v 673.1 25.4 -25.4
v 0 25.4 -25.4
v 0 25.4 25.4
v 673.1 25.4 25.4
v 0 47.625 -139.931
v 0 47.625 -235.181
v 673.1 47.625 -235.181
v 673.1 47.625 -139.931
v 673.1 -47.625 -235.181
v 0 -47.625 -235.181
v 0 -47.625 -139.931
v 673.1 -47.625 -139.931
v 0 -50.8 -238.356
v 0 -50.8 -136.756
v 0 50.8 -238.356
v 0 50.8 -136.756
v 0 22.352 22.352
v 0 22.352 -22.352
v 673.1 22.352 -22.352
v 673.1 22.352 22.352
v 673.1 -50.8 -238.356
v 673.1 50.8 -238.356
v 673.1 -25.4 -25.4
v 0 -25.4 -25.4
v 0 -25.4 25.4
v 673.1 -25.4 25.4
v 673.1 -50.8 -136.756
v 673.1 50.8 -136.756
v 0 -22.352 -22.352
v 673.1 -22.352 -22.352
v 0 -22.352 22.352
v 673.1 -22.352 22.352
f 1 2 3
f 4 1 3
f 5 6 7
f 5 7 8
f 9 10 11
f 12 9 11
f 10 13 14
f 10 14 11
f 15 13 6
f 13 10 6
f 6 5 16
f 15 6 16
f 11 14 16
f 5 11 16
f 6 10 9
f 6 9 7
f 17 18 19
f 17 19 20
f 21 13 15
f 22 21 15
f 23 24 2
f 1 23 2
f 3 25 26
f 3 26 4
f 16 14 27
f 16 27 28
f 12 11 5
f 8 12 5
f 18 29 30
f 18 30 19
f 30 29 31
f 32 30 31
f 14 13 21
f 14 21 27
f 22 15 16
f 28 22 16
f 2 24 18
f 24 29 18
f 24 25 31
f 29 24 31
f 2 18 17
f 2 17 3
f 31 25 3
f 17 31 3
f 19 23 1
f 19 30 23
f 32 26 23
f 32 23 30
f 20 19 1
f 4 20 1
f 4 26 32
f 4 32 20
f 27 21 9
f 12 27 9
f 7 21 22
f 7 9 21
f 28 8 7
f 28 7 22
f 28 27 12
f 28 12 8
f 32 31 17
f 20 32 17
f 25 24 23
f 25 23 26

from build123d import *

# Parameters (mm, degrees)
F0_W     = 50.8
F0_H     = 50.8
F0_W_2   = 44.704
F0_H_2   = 44.704
F1_DEPTH = 673.1
F2_W     = 101.6
F2_H     = 101.6
F2_W_2   = 95.25
F2_H_2   = 95.25
F3_DEPTH = 673.1


with BuildPart() as f1:
    # F0 (on Right) → F1 (new body)
    with BuildSketch(Plane.YZ):
        Rectangle(F0_W, F0_H)
        Rectangle(F0_W_2, F0_H_2, mode=Mode.SUBTRACT)
    extrude(amount=F1_DEPTH)


with BuildPart() as f3:
    # F2 (on Right) → F3 (new body)
    with BuildSketch(Plane.YZ):
        with Locations((0, -187.556356)):
            Rectangle(F2_W, F2_H)
        with Locations((0, -187.556356)):
            Rectangle(F2_W_2, F2_H_2, mode=Mode.SUBTRACT)
    extrude(amount=F3_DEPTH)


solid = Compound([f1.part, f3.part])
